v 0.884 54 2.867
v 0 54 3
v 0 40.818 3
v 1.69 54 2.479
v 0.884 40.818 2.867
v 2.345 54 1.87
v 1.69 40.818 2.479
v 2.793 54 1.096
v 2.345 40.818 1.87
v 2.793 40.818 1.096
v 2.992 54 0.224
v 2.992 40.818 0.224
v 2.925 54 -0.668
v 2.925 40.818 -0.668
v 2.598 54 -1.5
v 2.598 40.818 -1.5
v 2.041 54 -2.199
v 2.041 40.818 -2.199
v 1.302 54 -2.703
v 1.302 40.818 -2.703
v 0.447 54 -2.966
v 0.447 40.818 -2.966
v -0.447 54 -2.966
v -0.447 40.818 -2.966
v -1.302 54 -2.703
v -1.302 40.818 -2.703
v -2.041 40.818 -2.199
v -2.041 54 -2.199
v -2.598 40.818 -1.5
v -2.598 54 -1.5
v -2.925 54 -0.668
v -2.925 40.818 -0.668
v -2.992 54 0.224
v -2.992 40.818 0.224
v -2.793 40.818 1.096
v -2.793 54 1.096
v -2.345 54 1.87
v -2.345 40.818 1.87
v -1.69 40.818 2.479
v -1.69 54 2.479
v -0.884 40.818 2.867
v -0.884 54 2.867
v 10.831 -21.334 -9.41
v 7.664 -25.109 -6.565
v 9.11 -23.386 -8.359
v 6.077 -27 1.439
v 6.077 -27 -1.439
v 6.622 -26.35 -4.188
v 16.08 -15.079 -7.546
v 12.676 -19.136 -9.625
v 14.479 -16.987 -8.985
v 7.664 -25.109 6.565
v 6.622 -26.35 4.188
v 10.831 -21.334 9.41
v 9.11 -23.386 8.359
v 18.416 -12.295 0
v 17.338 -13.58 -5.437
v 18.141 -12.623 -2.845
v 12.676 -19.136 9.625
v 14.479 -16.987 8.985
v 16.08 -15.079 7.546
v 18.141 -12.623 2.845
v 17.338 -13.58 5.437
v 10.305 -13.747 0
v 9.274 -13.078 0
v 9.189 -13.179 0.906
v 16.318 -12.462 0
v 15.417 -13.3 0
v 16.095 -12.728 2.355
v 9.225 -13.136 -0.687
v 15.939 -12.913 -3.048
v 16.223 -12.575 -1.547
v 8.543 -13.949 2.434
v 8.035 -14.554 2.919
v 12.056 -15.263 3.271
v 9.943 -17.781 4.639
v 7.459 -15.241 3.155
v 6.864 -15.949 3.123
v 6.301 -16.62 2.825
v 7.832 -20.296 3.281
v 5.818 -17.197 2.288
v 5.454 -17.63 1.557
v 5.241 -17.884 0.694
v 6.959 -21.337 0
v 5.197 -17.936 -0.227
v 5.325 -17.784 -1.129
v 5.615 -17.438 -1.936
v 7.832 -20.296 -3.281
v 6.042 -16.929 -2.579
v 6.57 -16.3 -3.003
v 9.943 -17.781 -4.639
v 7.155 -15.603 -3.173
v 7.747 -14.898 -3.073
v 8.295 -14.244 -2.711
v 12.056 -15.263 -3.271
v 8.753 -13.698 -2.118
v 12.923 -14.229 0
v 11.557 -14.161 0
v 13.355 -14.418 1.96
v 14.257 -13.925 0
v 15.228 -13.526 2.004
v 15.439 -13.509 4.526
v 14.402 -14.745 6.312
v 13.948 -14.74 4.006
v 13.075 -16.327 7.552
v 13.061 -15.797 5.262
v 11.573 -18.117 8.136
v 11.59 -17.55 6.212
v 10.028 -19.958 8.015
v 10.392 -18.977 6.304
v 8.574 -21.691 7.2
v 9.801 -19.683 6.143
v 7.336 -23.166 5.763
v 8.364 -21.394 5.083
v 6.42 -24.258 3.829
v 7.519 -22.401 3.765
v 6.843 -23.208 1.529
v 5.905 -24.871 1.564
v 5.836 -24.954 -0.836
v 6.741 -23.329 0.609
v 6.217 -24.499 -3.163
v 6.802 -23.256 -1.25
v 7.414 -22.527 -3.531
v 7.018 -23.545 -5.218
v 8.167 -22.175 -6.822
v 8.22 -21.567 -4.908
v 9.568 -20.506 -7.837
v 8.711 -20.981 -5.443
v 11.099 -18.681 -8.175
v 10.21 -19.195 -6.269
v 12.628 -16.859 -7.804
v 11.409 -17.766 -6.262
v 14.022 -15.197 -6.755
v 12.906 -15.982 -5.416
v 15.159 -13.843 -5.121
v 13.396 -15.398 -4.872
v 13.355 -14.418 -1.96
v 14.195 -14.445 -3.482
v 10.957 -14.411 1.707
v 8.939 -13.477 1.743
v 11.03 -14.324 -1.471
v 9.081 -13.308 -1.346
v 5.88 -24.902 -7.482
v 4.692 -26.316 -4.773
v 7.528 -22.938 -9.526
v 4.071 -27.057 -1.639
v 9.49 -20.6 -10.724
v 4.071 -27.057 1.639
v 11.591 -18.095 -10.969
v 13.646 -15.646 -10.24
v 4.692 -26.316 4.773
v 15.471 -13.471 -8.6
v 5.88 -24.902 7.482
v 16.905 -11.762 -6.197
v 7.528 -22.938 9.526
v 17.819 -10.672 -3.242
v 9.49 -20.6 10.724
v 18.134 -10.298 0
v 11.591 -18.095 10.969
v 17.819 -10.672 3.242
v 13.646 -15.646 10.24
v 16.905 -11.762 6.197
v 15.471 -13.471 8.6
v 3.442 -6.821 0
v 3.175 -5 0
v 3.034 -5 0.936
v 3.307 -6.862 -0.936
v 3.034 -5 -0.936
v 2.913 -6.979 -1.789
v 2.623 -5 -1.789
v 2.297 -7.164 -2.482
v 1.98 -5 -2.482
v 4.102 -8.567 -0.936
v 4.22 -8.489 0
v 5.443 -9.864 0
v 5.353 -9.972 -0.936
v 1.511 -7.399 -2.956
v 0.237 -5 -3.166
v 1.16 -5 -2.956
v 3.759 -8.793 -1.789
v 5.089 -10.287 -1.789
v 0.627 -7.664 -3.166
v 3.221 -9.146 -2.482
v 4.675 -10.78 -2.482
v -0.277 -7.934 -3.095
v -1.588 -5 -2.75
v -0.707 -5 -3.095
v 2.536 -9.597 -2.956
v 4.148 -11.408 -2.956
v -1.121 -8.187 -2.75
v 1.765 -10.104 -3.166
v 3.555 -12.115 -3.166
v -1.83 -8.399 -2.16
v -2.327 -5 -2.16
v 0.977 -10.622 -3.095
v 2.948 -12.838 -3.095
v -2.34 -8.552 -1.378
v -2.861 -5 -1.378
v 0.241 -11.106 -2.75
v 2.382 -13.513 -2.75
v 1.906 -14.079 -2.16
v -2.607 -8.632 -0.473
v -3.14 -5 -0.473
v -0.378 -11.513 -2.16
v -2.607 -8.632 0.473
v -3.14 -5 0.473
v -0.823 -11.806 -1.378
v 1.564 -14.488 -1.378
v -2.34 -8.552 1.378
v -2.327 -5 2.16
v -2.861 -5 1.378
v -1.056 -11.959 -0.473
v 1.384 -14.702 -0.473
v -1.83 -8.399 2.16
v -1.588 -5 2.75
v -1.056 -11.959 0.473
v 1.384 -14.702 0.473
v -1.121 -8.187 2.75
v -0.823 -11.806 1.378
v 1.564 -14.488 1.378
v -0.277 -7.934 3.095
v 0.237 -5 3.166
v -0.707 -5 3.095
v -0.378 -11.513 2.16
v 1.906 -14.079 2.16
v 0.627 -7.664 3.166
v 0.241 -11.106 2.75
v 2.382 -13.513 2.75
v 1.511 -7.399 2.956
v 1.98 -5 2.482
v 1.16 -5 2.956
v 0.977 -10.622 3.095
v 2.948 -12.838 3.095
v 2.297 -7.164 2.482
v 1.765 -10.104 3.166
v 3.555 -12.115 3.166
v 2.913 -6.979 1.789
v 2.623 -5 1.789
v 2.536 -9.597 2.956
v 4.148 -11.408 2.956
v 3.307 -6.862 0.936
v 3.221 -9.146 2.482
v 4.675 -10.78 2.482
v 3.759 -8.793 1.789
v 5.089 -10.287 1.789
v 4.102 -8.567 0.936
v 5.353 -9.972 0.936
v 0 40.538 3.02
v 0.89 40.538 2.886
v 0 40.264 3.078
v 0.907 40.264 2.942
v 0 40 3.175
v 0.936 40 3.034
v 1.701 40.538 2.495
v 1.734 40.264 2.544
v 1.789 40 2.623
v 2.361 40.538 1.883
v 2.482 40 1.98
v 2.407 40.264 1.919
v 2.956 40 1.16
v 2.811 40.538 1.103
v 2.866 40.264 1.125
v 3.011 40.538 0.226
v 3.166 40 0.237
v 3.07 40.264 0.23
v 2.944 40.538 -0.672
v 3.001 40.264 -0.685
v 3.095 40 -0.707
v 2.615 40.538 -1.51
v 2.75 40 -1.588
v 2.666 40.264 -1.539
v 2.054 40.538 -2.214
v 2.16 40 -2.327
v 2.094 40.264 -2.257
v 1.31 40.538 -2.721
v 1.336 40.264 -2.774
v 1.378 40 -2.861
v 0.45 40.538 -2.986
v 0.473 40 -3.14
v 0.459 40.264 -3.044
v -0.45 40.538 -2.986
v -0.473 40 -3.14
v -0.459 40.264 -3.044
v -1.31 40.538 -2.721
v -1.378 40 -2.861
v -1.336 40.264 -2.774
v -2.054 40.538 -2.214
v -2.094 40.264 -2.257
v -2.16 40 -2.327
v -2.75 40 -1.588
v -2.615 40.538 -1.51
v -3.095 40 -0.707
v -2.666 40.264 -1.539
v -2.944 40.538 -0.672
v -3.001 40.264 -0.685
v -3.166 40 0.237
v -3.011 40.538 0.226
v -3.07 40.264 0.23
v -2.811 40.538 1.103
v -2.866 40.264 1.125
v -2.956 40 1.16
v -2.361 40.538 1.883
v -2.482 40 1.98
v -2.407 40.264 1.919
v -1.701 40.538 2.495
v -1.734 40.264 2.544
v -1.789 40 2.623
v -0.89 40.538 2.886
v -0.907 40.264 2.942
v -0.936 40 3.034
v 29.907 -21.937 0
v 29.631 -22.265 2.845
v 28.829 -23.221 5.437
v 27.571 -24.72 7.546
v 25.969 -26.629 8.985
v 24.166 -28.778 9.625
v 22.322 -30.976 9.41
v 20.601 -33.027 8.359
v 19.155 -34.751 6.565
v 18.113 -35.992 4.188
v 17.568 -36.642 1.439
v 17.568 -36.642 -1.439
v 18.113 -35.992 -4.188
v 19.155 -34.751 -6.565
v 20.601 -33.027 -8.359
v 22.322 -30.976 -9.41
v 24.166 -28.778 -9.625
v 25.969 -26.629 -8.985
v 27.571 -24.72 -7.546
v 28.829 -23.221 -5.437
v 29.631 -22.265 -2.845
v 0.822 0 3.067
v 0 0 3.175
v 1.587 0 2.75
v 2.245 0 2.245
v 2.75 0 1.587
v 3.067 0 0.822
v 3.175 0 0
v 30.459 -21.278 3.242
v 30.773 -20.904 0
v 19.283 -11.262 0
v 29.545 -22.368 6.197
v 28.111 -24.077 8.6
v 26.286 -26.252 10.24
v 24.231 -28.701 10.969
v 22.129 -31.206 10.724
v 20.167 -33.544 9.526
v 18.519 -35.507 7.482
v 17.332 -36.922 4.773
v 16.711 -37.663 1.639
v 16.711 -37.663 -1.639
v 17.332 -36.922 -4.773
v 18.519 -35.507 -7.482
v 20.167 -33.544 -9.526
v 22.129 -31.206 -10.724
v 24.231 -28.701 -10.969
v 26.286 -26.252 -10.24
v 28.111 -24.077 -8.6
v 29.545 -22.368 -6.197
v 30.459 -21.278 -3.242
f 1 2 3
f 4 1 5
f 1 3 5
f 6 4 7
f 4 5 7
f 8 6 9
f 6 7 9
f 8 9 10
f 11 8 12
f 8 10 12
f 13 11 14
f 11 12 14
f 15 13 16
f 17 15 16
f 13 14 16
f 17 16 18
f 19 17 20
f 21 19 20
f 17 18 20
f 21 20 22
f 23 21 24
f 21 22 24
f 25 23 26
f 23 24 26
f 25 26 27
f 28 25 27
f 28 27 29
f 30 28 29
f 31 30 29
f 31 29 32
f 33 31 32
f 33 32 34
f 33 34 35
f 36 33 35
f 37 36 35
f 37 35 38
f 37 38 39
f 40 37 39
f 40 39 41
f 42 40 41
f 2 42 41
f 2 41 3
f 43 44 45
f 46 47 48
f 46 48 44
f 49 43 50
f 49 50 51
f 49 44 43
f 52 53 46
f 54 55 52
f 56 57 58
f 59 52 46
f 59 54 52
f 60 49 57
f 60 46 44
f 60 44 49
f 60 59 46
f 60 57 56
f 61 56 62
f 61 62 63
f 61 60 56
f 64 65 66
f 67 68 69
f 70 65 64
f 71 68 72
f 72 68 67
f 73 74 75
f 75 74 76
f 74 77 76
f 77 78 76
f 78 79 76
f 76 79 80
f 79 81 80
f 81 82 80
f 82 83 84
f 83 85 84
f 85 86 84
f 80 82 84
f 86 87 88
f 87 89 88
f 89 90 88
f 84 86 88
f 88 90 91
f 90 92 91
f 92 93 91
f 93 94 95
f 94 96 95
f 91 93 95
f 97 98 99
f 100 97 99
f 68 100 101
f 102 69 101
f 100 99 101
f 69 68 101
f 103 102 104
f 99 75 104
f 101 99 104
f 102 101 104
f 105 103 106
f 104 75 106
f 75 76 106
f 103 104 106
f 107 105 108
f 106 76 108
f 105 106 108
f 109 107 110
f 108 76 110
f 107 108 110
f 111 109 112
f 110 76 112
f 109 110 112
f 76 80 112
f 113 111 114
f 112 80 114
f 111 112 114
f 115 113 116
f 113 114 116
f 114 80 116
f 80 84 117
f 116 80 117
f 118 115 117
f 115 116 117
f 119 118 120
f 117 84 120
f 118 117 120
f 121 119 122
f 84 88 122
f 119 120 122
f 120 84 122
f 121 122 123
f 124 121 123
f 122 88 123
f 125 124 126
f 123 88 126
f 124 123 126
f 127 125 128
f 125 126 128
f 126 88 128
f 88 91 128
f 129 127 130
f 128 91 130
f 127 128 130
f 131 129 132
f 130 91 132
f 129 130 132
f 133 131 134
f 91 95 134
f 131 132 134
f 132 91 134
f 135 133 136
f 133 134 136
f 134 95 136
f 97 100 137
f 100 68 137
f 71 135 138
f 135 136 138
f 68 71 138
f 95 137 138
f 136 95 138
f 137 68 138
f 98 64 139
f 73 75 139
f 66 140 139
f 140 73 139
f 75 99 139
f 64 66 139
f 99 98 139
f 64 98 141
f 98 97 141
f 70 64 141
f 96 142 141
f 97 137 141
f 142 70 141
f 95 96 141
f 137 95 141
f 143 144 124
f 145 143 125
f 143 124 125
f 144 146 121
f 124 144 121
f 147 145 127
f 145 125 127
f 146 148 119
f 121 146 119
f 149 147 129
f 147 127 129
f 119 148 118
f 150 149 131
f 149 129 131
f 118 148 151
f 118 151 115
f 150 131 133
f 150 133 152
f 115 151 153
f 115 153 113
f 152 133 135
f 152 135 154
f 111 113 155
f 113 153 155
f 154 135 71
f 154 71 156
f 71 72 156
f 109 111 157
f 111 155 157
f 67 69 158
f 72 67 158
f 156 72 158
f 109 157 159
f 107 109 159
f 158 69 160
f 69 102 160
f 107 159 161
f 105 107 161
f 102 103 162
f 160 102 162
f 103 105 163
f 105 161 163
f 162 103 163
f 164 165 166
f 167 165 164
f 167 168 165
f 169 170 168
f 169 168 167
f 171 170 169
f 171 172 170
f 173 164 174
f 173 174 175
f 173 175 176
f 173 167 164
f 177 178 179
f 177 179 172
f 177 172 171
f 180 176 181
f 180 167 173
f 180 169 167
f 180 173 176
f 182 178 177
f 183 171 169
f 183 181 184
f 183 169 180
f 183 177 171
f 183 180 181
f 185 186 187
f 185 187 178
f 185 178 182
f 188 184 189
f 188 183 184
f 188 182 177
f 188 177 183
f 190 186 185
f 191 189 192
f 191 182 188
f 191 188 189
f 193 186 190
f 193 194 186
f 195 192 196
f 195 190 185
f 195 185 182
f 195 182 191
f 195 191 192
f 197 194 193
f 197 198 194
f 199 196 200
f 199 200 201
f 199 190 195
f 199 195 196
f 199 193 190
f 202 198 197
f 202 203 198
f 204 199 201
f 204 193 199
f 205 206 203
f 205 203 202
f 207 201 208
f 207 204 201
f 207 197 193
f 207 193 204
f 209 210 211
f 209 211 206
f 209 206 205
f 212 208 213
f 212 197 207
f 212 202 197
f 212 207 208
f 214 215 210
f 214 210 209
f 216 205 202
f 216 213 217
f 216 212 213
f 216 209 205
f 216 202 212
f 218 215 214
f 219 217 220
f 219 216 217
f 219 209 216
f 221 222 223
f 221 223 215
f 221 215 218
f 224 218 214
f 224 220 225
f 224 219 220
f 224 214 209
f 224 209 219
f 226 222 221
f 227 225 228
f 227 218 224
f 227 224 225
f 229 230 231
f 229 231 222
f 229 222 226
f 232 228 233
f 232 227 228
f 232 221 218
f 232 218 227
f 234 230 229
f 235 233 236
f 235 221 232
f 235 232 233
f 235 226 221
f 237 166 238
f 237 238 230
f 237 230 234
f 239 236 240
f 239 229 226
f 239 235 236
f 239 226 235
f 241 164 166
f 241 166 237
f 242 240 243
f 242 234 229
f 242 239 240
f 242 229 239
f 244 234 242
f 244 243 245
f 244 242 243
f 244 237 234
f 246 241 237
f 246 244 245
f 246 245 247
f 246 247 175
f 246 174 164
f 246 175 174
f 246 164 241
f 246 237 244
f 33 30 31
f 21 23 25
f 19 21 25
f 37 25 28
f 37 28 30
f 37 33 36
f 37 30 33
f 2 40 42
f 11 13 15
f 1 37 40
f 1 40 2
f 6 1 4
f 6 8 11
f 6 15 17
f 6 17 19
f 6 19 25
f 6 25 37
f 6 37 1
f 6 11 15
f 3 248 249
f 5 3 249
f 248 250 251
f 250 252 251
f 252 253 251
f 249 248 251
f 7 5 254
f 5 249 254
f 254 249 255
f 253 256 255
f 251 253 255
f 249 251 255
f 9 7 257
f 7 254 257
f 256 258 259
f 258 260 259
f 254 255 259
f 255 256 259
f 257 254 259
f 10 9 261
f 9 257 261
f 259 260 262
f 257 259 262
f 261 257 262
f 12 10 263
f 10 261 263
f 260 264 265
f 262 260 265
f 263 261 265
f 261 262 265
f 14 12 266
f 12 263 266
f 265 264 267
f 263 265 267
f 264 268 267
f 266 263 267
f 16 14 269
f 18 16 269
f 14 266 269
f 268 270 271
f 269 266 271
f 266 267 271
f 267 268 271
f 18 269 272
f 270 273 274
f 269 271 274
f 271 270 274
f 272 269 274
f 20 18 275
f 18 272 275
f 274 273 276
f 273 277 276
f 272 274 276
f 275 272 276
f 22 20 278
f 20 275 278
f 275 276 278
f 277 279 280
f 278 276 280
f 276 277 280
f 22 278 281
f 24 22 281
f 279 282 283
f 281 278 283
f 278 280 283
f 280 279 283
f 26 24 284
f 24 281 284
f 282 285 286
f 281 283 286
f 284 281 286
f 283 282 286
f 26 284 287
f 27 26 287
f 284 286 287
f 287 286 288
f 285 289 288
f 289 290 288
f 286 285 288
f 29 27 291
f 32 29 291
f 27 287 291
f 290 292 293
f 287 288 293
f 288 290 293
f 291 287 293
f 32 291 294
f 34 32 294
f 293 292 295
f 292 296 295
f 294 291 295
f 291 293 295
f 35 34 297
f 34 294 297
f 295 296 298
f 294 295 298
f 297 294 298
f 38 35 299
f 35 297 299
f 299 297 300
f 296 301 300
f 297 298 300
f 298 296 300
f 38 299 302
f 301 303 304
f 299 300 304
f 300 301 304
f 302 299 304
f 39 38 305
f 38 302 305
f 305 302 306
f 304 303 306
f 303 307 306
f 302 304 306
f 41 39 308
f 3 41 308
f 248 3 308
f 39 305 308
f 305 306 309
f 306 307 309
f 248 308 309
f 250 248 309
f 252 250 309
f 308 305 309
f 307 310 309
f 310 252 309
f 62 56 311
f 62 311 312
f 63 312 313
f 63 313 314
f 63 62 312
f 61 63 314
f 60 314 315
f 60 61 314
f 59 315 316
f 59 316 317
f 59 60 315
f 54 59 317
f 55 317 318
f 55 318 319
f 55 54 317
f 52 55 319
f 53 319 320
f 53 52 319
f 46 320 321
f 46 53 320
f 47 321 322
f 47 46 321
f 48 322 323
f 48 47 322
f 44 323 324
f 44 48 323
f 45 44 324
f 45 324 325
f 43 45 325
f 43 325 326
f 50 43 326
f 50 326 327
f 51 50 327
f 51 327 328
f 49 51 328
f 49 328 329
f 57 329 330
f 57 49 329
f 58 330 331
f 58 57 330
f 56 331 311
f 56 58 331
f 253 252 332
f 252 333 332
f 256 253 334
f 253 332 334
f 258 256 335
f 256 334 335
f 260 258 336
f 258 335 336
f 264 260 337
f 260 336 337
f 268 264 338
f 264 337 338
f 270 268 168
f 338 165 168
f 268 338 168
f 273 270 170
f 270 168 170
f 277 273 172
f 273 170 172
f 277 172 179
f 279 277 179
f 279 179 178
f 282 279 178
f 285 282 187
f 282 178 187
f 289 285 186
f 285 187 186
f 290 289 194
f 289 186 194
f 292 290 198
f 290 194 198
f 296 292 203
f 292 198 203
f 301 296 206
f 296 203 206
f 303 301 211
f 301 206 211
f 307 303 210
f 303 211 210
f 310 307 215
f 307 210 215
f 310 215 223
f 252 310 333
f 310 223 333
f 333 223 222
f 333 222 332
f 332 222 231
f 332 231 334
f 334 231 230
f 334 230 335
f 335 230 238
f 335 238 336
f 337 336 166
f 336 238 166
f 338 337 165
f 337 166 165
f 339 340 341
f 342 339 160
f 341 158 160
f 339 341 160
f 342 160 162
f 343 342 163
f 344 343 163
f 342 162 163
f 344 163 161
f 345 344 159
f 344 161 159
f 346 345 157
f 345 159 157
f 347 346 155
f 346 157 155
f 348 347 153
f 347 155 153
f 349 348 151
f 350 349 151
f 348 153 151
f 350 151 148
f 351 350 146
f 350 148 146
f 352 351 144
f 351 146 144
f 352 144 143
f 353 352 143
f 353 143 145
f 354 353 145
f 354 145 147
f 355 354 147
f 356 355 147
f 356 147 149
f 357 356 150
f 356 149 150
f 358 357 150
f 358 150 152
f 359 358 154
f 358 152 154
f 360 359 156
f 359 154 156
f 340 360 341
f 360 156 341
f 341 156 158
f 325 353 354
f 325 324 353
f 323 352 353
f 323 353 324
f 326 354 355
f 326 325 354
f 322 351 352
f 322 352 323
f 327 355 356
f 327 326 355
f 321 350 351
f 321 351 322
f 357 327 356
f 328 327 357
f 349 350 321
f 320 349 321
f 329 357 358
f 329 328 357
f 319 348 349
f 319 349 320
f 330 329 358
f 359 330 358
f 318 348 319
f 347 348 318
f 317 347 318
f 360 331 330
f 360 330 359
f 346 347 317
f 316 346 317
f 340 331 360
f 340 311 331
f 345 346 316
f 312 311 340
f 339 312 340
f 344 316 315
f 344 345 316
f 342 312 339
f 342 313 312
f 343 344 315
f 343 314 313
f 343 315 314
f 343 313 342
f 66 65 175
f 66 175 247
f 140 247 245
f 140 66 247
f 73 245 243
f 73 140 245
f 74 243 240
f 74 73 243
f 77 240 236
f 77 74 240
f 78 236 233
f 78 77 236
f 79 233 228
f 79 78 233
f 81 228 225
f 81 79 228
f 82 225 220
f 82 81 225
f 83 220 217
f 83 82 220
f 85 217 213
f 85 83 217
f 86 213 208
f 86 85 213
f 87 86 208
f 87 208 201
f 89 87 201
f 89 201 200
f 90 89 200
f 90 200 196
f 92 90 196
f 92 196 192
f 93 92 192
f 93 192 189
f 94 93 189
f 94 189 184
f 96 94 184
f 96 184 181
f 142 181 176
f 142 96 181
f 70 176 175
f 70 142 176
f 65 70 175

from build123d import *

# Parameters (mm, degrees)
SKETCH1_R           = 3.175
BOSS_EXTRUDE1_DEPTH = 40
SKETCH2_R           = 3.175
SKETCH5_R           = 11
BOSS_EXTRUDE2_DEPTH = 1.5
SKETCH4_R           = 11
SKETCH4_R_2         = 9.652
BOSS_EXTRUDE3_DEPTH = 15
SKETCH6_R           = 3
BOSS_EXTRUDE4_DEPTH = 14
FILLET1_R           = 2
FILLET2_R           = 5


with BuildPart() as part:
    # Sketch1 → Boss-Extrude1 (new body)
    with BuildSketch(Plane(origin=(0, 0, 0), x_dir=(1, 0, 0), z_dir=(0, 1, 0))):
        with Locations(Location((0, 0, 0), (0, 0, 270))):
            Circle(SKETCH1_R)
    extrude(amount=BOSS_EXTRUDE1_DEPTH)

    # Sweep1: sweep along a path in Sketch3
    with BuildLine(Plane.XY) as sweep1_path:
        Line((0, 0), (0, -5))
        ThreePointArc((0, -5), (0.892418328, -9.025438943), (3.402448018, -12.296573321))
        Line((3.402448018, -12.296573321), (11.062892449, -18.724449418))
    # Sketch2 → Sweep1 (sweep)
    with BuildSketch(Plane.XZ):
        Circle(SKETCH2_R)
    sweep(path=sweep1_path.line)

    # Sketch5 → Boss-Extrude2 (add)
    with BuildSketch(Plane(origin=(15.71196326, -13.183902576, 0), x_dir=(0, 0, -1), z_dir=(0.7660444431189796, -0.6427876096865375, 0))):
        with Locations(Location((0, -7.232670233, 0), (0, 0, 90))):
            Circle(SKETCH5_R)
    extrude(amount=BOSS_EXTRUDE2_DEPTH)

    # Sketch4 → Boss-Extrude3 (add)
    with BuildSketch(Plane(origin=(16.861029925, -14.148083991, 0), x_dir=(0, 0, -1), z_dir=(0.7660444431189796, -0.6427876096865375, 0))):
        with Locations(Location((0, -7.232670233, 0), (0, 0, 90))):
            Circle(SKETCH4_R)
        with Locations(Location((0, -7.232670233, 0), (0, 0, 90))):
            Circle(SKETCH4_R_2, mode=Mode.SUBTRACT)
    extrude(amount=BOSS_EXTRUDE3_DEPTH)

    # Sketch6 → Boss-Extrude4 (add)
    with BuildSketch(Plane(origin=(0, 40, 0), x_dir=(1, 0, 0), z_dir=(0, 1, 0))):
        with Locations(Location((0, 0, 0), (0, 0, 270))):
            Circle(SKETCH6_R)
    extrude(amount=BOSS_EXTRUDE4_DEPTH)

    # Fillet1
    # the kernel refuses this fillet: 2 mm, written as the material it adds along each edge
    with BuildSketch(Plane(origin=(0, 40, 0), x_dir=(0, 0, 1), z_dir=(-1, 0, 0))) as fillet1_piece_1:
        with BuildLine():
            CenterArc((5, 0.818153409), FILLET1_R, 180, 24.146847997)
            Line((3, 0.818153409), (2.96, 0.818153409))
            Line((2.96, 0.818153409), (2.96, 0))
            Line((2.96, 0), (3, -0.04))
            ThreePointArc((3, -0.04), (3.0875, -0.04), (3.1385, -0.016363068))
            Line((3.1385, -0.016363068), (3.175, 0))
        make_face()
    revolve(axis=Axis((0, 40, 0), (0, 1, 0)))

    # Fillet2
    fillet2_edges = [part.edges().sort_by_distance(p)[0] for p in [
        (9.022041788, -21.156640524, 0),
    ]]
    fillet(fillet2_edges, radius=FILLET2_R)


solid = part.part
